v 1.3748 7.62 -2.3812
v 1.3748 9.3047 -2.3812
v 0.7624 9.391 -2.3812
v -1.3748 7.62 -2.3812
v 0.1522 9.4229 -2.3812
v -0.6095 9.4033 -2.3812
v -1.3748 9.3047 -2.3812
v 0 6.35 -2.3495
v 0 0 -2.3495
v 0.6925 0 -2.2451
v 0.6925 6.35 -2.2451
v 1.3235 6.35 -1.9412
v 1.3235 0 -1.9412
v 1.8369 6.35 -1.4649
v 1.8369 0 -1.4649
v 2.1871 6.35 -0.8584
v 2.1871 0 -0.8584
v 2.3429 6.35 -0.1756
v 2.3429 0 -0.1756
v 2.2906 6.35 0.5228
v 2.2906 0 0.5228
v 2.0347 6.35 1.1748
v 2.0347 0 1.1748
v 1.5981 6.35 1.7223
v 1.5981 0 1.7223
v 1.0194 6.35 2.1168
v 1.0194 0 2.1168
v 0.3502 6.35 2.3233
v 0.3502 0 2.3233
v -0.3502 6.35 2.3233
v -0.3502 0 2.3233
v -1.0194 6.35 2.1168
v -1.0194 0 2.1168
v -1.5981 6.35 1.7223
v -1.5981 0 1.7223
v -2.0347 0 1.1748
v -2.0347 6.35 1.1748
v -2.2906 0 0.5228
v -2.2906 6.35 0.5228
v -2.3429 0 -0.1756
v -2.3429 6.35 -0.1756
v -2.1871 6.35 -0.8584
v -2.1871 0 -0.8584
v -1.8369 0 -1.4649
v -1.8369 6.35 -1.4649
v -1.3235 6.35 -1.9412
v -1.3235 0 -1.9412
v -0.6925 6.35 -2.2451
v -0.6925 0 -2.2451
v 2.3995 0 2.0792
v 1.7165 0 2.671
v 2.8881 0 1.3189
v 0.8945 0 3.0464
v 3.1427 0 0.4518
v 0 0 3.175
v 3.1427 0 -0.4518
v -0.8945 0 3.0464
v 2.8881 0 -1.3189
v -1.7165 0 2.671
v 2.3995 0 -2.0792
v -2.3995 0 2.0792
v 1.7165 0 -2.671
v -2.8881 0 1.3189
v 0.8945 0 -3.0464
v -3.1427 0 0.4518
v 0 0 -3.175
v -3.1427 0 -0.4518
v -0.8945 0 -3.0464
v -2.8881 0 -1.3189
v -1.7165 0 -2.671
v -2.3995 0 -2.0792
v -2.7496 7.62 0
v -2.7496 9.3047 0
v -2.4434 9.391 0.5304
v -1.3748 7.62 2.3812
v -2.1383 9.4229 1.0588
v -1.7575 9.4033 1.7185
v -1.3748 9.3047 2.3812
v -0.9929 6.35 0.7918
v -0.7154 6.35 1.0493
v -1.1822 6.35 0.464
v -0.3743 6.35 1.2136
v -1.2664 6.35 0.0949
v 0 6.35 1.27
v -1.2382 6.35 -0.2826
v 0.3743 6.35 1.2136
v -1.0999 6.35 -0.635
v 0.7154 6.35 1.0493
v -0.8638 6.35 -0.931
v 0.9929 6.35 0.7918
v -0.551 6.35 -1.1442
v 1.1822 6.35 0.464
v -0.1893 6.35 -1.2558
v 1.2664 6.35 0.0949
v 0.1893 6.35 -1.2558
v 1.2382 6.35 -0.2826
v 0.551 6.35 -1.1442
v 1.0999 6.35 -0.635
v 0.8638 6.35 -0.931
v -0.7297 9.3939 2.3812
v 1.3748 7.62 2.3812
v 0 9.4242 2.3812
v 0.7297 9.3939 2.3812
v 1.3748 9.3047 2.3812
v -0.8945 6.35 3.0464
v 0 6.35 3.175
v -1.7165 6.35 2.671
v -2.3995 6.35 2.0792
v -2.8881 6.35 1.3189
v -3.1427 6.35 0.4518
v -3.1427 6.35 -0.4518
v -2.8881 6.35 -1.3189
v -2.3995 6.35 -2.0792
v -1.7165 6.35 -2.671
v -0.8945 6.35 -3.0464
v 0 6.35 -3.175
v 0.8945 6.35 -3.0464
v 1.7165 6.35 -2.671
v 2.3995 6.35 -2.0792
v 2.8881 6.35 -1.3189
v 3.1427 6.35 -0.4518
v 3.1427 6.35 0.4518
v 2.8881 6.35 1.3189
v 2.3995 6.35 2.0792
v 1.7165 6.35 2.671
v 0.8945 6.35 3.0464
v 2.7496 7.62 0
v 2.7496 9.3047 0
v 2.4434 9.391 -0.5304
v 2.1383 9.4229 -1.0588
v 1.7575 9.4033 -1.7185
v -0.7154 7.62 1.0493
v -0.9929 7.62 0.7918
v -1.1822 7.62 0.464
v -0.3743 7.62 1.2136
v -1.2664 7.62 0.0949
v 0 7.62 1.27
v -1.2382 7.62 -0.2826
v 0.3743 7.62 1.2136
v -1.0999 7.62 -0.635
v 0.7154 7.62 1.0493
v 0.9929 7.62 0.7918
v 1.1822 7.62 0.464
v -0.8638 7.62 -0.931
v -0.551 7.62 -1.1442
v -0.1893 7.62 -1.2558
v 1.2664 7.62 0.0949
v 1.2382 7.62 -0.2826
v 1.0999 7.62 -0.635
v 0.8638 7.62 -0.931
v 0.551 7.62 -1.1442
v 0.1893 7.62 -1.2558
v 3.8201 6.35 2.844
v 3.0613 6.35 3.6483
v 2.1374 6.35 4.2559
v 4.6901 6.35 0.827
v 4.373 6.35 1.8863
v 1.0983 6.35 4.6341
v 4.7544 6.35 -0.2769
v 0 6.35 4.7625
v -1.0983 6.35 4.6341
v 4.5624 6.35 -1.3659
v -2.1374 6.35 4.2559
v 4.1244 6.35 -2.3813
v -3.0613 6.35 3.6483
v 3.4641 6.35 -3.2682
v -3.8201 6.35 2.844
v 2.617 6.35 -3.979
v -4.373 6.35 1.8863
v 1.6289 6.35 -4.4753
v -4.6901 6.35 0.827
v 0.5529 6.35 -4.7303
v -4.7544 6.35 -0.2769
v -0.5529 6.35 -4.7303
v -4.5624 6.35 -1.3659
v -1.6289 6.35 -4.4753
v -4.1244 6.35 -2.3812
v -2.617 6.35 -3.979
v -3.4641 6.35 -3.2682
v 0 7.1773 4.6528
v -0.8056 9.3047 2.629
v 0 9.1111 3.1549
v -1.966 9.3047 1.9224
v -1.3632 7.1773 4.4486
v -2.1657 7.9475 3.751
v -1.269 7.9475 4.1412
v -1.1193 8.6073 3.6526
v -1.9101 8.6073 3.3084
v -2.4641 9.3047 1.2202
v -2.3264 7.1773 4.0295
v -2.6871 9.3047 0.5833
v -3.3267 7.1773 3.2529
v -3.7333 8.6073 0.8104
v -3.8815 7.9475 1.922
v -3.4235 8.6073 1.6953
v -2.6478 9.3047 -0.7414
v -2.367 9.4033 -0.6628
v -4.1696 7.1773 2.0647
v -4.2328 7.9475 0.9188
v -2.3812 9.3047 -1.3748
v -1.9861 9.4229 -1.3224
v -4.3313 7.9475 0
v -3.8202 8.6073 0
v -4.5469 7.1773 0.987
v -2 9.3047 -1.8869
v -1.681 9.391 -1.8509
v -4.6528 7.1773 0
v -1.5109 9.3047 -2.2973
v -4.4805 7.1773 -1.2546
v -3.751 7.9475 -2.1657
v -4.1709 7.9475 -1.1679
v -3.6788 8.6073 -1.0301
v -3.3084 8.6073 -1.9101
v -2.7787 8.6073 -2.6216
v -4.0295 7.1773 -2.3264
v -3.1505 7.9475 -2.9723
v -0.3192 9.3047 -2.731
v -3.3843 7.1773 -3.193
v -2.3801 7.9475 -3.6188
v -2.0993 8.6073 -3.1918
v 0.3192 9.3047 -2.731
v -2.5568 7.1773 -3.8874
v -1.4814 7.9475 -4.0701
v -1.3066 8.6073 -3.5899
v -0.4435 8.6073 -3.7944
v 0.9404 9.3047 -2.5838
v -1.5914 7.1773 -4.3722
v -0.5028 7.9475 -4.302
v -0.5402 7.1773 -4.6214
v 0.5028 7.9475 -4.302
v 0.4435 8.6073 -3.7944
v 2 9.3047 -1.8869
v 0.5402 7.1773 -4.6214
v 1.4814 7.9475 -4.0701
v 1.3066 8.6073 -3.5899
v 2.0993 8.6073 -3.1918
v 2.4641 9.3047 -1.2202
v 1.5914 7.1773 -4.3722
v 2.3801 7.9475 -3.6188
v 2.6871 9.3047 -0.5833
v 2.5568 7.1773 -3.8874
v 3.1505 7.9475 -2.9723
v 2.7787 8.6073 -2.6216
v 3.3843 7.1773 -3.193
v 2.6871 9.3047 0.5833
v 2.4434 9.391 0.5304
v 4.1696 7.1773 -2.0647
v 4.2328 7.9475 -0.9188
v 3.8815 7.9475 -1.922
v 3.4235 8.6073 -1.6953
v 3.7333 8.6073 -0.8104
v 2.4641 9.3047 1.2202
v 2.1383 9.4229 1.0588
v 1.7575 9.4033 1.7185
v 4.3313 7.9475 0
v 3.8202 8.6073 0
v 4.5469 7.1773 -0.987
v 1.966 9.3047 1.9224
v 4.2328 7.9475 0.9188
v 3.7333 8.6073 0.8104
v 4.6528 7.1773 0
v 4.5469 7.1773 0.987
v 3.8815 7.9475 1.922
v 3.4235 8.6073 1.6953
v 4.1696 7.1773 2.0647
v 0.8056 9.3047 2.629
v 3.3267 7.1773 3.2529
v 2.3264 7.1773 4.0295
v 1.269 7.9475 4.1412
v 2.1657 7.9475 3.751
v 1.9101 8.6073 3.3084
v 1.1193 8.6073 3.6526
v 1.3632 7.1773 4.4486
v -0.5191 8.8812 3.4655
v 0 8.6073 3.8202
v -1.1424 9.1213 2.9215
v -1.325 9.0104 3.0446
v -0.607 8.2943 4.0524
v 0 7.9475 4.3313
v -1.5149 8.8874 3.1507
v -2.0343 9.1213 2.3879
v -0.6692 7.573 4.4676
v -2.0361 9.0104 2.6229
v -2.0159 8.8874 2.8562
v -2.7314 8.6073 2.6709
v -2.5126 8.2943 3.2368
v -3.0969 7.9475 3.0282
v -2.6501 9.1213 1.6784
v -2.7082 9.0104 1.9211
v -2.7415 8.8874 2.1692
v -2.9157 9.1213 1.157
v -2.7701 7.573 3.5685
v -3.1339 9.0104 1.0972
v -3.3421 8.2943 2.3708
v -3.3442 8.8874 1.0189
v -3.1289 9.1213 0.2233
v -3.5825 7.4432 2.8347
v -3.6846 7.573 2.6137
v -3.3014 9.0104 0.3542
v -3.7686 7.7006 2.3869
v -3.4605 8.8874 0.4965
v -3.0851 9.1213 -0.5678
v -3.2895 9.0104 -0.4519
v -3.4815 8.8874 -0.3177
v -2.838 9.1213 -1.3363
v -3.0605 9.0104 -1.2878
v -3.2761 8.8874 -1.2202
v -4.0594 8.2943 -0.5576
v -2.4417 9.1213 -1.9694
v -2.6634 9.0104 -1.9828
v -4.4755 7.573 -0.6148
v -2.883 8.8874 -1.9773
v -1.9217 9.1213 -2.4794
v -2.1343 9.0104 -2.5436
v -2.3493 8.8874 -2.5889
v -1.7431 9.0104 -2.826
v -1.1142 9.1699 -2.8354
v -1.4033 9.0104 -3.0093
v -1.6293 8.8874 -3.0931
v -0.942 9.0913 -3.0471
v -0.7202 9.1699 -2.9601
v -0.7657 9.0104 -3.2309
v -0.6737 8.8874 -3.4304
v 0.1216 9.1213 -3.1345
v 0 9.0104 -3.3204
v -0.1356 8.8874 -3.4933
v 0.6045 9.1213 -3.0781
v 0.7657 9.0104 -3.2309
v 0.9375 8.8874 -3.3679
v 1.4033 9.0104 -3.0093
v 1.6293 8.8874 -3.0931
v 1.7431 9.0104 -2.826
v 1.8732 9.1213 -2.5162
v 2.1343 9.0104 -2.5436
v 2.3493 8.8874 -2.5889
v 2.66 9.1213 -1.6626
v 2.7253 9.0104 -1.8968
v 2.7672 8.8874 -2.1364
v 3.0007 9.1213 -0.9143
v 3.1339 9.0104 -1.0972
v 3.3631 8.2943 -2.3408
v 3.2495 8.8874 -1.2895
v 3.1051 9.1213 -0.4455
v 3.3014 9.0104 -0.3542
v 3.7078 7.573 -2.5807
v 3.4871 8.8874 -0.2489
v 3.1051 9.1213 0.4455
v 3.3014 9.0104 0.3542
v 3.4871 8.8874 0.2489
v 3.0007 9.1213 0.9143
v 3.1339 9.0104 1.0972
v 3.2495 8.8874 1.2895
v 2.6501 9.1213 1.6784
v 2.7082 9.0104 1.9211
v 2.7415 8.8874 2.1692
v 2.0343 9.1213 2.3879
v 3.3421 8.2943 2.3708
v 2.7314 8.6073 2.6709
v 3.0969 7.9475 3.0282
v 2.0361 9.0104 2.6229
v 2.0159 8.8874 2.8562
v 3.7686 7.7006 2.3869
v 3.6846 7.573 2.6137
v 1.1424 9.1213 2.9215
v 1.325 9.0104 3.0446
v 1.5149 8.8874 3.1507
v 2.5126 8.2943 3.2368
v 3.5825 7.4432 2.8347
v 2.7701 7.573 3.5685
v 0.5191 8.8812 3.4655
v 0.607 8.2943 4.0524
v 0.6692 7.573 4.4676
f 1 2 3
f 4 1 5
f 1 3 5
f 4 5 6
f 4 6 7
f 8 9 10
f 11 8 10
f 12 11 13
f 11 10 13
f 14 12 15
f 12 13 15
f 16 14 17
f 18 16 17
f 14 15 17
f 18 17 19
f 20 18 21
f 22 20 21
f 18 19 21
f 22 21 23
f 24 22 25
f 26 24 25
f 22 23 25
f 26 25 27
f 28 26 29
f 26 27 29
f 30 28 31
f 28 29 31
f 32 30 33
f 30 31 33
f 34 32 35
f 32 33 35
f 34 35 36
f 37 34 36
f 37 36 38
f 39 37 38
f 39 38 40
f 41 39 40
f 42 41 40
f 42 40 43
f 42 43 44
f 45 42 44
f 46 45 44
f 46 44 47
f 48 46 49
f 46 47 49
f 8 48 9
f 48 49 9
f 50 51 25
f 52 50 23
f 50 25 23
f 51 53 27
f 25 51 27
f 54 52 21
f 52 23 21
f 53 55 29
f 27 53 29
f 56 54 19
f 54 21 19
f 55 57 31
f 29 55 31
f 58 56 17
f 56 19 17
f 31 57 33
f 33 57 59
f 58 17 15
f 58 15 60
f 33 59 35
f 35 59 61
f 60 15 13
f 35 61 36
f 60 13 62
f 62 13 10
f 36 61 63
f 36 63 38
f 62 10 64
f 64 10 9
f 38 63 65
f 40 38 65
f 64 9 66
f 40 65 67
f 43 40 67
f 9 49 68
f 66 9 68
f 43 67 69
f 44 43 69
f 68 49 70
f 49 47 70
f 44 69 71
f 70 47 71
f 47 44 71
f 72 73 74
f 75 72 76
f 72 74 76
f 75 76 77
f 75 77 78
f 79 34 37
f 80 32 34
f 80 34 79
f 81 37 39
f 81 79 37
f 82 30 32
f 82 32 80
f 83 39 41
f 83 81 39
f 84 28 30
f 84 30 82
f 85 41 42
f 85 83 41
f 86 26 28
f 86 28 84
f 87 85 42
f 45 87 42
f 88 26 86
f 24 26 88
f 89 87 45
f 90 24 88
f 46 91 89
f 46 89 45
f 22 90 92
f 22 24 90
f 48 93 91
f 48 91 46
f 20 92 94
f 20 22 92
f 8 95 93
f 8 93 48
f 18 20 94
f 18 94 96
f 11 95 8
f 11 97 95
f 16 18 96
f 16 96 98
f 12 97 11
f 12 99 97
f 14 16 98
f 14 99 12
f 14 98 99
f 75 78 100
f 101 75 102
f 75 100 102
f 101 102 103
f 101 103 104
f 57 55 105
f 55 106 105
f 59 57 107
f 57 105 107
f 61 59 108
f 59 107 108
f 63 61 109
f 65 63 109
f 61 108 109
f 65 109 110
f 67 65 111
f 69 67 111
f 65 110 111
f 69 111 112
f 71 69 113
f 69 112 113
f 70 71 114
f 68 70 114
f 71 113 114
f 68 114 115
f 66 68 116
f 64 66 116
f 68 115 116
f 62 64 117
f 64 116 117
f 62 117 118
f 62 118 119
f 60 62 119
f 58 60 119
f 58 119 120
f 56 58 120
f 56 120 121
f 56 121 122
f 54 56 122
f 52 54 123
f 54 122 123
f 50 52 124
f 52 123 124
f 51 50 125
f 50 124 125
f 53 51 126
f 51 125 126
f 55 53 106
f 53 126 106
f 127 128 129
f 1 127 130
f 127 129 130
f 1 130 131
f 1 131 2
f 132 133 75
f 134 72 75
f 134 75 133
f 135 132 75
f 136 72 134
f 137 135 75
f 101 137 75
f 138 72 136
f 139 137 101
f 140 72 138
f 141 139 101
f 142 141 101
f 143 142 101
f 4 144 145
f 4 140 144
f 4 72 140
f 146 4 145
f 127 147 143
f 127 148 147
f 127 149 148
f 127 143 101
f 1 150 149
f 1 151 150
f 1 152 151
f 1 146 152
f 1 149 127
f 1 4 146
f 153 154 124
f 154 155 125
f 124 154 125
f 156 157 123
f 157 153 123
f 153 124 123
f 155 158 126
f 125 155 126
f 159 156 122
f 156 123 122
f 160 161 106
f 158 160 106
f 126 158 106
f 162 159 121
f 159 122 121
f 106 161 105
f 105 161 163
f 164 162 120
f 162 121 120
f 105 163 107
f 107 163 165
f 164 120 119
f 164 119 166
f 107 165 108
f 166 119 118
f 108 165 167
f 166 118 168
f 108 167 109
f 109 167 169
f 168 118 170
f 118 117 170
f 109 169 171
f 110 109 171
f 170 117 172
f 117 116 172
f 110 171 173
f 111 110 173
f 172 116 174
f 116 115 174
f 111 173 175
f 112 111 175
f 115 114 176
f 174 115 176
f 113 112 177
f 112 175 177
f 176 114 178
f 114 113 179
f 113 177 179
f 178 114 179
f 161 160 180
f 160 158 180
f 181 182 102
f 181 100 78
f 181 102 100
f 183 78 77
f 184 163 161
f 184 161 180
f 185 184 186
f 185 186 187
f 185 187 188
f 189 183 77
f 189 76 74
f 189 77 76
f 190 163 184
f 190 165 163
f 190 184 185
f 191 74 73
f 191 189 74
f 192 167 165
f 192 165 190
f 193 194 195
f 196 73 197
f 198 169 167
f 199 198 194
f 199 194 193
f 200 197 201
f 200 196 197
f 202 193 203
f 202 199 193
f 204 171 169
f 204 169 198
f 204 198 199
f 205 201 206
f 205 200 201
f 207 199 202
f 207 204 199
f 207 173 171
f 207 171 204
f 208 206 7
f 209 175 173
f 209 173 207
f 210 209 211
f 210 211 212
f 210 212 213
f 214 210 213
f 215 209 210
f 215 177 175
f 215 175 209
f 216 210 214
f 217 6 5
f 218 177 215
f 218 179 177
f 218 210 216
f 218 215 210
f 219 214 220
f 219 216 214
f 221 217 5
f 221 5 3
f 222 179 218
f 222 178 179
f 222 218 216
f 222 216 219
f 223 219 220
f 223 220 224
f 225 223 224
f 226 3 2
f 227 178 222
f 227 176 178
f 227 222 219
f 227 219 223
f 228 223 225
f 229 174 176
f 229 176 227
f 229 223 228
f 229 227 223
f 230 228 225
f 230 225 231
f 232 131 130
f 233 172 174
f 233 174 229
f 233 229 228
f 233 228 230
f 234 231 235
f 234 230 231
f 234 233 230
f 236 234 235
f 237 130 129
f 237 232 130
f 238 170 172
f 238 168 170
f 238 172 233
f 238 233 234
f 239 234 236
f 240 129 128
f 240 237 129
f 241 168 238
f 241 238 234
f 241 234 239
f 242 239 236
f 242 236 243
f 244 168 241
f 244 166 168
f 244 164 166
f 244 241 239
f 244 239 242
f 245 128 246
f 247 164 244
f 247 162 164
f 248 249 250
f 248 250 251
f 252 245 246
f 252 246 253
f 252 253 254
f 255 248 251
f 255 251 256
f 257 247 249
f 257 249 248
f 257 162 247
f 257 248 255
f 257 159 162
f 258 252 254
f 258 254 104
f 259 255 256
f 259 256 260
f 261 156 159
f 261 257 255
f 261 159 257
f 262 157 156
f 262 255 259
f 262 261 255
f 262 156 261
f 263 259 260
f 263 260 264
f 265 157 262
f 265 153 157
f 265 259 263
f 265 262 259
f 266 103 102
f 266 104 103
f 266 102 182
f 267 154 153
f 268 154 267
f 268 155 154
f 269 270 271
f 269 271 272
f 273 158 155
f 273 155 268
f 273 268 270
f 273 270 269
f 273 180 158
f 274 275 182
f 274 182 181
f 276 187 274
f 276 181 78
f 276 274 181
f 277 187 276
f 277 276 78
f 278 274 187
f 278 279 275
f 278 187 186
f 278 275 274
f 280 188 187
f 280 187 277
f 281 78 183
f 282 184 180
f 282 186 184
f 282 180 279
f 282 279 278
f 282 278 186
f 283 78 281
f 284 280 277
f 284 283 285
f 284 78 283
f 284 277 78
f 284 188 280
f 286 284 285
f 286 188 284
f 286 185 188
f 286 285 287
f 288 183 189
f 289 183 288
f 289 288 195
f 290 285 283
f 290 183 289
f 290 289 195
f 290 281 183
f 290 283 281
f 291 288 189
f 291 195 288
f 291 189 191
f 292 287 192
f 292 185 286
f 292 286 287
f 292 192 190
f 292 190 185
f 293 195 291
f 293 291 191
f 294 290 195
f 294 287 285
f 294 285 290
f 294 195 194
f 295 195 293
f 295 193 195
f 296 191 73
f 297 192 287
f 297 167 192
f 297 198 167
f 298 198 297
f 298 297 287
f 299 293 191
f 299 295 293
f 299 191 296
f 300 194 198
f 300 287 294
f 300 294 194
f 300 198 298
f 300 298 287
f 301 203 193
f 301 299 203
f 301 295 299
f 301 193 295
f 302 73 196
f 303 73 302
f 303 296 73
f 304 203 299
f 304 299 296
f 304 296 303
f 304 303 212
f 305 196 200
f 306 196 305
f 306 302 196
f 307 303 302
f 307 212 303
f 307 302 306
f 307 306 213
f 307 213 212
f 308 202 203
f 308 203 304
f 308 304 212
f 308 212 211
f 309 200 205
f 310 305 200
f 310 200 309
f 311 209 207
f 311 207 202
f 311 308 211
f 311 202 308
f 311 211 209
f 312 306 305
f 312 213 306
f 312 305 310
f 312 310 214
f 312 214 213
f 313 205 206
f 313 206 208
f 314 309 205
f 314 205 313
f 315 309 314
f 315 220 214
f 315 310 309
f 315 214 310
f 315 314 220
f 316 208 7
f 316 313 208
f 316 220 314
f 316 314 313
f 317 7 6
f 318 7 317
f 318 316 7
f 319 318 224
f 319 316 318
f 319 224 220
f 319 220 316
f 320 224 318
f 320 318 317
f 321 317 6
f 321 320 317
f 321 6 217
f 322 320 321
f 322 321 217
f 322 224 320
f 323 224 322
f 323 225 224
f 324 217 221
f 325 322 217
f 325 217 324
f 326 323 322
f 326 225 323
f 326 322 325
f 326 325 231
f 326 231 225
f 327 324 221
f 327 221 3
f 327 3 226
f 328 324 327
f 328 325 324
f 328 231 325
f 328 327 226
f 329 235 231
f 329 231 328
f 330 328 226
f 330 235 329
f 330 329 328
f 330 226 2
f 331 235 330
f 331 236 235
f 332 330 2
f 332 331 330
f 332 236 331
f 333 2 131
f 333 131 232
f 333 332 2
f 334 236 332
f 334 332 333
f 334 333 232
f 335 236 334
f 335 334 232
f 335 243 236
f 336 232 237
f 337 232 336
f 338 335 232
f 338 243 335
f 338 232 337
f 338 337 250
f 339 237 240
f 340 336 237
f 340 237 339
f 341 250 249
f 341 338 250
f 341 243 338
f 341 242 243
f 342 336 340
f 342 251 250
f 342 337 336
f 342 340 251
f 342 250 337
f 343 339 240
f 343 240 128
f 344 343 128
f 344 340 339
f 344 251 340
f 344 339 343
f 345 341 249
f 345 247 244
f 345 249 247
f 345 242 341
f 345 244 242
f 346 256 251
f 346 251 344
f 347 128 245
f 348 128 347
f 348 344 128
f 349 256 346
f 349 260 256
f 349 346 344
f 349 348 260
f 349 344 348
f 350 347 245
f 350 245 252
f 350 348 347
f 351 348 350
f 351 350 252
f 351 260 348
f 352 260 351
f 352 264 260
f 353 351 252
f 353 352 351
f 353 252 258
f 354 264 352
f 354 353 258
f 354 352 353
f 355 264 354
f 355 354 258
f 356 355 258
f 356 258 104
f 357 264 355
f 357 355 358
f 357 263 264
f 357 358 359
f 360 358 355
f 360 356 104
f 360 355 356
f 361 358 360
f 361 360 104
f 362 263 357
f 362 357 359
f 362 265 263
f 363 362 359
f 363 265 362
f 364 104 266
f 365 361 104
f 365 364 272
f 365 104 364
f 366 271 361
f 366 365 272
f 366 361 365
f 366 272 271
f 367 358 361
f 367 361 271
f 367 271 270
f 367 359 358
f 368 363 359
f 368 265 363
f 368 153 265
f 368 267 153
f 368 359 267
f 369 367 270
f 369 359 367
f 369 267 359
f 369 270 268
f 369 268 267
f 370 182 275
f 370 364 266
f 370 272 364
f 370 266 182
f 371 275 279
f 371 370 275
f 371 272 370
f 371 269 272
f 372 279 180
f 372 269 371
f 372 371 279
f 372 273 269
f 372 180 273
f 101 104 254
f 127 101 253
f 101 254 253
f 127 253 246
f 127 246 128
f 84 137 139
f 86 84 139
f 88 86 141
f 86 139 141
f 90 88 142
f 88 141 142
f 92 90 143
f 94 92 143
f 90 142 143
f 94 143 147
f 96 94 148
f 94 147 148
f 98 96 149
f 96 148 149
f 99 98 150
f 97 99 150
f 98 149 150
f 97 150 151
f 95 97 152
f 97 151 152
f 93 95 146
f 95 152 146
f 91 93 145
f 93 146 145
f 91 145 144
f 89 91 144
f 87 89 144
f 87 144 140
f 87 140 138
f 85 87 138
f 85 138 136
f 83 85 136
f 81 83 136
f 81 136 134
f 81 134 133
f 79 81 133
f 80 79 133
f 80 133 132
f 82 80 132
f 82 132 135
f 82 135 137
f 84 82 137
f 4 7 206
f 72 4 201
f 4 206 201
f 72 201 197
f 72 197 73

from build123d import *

# Parameters (mm, degrees)
CUT_EXTRUDE1_DEPTH = 1.905
CUT_EXTRUDE2_REACH = 12.17
SKETCH3_R          = 1.27
SKETCH4_R          = 2.3495
CUT_EXTRUDE3_DEPTH = 6.35
FILLET1_R          = 3.175


with BuildPart() as part:
    # Sketch1 → Revolve1 (revolve)
    with BuildSketch(Plane.XY, mode=Mode.PRIVATE) as revolve1_sk:
        Polygon((0, 0), (-3.175, 0), (-3.175, 6.35), (-4.7625, 6.35), (-4.7625, 9.525), (0, 9.525), align=None)
    revolve(revolve1_sk.sketch.rotate(Axis((0, 9.525, 0), (0, -1, 0)), 270), axis=Axis((0, 9.525, 0), (0, -1, 0)))

    # Sketch2 → Cut-Extrude1 (cut)
    with BuildSketch(Plane(origin=(0, 9.525, 0), x_dir=(1, 0, 0), z_dir=(0, 1, 0))):
        Polygon((-1.374815329, -2.38125), (1.374815329, -2.38125), (2.749630657, 0), (1.374815329, 2.38125), (-1.374815329, 2.38125), (-2.749630657, 0), align=None)
    extrude(amount=-CUT_EXTRUDE1_DEPTH, mode=Mode.SUBTRACT)

    # Sketch3 → Cut-Extrude2 (cut, up to next)
    with BuildSketch(Plane(origin=(0, 7.62, 0), x_dir=(1, 0, 0), z_dir=(0, 1, 0)), mode=Mode.PRIVATE) as cut_extrude2_sk1:
        with Locations(Location((0, 0, 0), (0, 0, 270))):
            Circle(SKETCH3_R)
    cut_extrude2_tool1 = extrude(cut_extrude2_sk1.sketch, amount=-CUT_EXTRUDE2_REACH, mode=Mode.PRIVATE) & part.part
    add(cut_extrude2_tool1.solids().sort_by_distance((0, 7.62, 0))[0], mode=Mode.SUBTRACT)

    # Sketch4 → Cut-Extrude3 (cut)
    with BuildSketch(Plane.XZ):
        with Locations(Location((0, 0, 0), (0, 0, 270))):
            Circle(SKETCH4_R)
    extrude(amount=-CUT_EXTRUDE3_DEPTH, mode=Mode.SUBTRACT)

    # Fillet1
    # the kernel refuses this fillet: 3.175 mm, written as the material it takes off along each edge
    with BuildSketch(Plane(origin=(0, 9.525, 0), x_dir=(0, 0, 1), z_dir=(1, 0, 0))) as fillet1_piece_1:
        with BuildLine():
            CenterArc((4.7625 - FILLET1_R, FILLET1_R), FILLET1_R, 270, 90)
            Line((4.7625 - FILLET1_R, 0), (4.7625, 0))
            Line((4.7625, 0), (4.7625, FILLET1_R))
        make_face()
    revolve(axis=Axis((0, 9.525, 0), (0, -1, 0)), mode=Mode.SUBTRACT)


solid = part.part
